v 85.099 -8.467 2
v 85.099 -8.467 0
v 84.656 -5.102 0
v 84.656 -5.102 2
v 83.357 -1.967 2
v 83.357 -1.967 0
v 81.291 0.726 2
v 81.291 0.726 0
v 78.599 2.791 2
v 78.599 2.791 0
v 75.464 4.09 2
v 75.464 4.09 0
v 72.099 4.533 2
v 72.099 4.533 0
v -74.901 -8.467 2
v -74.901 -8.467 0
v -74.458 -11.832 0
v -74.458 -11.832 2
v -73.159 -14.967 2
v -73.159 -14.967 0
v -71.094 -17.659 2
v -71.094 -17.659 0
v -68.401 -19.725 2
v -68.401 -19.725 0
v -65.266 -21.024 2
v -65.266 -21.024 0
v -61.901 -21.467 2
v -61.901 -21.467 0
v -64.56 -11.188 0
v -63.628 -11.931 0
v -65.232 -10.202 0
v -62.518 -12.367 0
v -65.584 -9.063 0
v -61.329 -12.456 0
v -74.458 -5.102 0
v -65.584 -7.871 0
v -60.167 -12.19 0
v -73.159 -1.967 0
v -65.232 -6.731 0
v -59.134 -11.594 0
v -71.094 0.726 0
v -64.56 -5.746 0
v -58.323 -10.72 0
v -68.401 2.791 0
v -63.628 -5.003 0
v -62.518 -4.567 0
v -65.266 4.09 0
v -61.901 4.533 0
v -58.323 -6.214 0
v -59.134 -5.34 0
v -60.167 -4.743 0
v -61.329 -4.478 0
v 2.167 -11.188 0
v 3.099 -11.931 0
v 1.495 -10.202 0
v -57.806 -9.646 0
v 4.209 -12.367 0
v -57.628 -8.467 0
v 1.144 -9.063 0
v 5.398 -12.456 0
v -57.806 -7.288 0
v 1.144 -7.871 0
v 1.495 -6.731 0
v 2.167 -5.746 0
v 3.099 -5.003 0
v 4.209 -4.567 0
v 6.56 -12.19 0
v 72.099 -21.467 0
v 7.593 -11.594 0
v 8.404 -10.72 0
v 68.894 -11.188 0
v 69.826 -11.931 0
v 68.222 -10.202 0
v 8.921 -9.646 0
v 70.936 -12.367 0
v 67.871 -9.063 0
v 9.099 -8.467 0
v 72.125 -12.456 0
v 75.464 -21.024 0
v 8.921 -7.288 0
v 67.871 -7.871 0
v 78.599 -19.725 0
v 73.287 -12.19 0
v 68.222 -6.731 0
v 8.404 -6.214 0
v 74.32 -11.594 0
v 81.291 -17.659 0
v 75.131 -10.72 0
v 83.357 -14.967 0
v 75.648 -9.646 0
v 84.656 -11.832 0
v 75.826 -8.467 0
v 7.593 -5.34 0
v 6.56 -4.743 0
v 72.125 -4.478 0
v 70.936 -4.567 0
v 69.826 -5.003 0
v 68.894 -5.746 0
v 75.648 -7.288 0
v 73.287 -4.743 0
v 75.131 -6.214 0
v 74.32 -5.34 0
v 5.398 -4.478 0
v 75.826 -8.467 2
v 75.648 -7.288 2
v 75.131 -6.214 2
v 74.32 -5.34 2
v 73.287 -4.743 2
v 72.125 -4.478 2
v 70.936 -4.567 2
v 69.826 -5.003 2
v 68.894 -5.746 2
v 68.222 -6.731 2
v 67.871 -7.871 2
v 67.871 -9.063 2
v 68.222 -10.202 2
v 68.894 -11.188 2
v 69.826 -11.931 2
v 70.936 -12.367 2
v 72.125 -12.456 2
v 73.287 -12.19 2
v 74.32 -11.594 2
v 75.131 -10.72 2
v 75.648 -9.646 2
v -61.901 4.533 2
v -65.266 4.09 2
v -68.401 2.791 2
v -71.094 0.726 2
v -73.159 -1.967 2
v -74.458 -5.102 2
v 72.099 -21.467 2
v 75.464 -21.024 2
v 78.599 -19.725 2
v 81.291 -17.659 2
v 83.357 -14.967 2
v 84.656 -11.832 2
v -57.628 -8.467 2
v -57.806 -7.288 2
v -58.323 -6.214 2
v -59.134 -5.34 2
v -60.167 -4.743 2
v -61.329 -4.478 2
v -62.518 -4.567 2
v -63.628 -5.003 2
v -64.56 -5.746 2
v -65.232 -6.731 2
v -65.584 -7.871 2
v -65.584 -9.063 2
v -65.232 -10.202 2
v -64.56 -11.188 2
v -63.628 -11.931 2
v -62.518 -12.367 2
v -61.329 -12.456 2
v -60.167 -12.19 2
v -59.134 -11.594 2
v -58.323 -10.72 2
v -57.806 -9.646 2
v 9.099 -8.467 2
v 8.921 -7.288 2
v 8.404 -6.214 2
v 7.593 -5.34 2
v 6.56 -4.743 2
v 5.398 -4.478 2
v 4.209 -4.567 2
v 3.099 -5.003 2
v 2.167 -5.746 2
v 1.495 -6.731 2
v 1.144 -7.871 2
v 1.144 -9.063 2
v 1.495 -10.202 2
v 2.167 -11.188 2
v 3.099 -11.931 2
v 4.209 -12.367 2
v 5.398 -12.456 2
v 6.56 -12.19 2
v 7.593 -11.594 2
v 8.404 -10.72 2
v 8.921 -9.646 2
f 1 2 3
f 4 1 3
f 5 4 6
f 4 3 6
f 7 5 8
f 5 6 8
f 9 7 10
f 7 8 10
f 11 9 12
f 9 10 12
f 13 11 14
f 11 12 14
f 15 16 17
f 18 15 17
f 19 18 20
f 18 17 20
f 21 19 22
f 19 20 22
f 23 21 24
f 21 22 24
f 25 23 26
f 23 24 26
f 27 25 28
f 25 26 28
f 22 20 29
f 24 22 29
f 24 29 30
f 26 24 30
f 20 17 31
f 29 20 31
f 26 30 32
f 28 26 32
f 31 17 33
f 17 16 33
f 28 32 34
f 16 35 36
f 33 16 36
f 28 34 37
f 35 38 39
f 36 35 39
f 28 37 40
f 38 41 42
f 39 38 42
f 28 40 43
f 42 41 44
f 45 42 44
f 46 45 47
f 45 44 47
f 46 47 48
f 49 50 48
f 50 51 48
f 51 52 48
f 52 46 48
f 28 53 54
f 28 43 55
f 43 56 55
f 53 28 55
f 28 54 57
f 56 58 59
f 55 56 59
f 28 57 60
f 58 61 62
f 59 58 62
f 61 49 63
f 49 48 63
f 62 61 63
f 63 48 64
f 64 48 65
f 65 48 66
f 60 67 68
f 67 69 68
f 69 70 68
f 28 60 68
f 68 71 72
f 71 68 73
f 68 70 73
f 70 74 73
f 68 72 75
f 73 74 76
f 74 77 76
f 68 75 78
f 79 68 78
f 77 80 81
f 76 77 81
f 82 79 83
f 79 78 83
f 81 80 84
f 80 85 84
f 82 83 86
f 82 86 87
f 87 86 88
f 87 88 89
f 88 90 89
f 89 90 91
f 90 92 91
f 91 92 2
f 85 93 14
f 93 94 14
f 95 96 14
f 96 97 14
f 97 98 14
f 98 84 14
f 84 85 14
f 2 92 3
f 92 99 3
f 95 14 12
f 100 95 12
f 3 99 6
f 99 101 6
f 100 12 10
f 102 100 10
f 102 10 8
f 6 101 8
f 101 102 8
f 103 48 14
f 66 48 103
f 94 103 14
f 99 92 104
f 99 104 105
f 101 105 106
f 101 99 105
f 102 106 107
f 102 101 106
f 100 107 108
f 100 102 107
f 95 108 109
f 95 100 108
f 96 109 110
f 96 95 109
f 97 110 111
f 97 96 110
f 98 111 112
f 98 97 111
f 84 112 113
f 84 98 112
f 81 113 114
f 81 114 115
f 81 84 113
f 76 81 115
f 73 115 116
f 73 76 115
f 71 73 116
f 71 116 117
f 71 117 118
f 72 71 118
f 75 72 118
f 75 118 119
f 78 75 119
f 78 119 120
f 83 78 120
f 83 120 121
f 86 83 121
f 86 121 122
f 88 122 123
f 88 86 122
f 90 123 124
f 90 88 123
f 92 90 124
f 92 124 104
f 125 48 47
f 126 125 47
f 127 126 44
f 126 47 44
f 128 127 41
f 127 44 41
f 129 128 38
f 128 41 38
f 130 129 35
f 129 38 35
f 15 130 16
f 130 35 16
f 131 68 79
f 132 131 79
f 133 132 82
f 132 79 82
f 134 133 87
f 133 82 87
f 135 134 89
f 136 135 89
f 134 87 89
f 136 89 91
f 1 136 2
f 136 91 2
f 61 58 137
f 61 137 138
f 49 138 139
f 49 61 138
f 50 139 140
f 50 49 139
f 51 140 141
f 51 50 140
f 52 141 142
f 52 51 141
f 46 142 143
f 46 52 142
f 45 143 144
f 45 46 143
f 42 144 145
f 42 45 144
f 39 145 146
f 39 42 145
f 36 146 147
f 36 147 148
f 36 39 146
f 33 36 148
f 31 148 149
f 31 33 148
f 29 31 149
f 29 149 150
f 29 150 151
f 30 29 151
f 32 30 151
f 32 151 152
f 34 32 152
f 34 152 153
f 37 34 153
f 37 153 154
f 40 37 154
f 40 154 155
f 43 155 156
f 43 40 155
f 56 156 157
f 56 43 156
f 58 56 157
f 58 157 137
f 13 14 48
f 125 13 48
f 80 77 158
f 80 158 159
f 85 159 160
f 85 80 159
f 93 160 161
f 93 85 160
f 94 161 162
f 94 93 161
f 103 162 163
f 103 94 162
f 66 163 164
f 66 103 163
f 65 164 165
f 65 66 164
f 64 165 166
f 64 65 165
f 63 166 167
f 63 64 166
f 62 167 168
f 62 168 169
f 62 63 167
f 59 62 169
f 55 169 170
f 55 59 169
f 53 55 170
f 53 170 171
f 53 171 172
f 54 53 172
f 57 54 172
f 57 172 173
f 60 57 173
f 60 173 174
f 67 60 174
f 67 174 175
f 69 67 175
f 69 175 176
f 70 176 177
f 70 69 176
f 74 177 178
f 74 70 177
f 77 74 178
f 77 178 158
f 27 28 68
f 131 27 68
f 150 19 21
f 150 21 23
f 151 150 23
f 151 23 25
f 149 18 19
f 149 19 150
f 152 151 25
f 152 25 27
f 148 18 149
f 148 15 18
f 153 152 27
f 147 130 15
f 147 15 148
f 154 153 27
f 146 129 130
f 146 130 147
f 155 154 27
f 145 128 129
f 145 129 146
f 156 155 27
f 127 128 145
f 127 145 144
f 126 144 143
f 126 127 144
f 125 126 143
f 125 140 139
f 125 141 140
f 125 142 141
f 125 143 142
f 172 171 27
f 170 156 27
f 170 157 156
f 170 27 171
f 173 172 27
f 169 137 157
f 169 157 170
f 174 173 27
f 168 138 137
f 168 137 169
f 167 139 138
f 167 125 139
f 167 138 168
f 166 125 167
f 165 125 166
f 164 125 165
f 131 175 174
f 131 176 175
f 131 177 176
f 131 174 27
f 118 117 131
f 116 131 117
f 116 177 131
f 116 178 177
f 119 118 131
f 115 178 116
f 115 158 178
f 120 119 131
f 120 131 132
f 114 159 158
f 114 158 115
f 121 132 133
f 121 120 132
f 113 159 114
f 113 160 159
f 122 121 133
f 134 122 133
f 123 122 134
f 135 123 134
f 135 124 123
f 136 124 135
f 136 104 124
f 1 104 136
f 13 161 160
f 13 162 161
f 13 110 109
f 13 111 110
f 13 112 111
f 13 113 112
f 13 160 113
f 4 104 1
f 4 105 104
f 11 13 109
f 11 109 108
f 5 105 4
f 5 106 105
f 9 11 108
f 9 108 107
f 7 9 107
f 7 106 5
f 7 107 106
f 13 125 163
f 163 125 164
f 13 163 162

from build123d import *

# Parameters (mm, degrees)
F0_R     = 4
F1_DEPTH = 2


with BuildPart() as f1:
    # F0 (on Top) → F1 (new body)
    with BuildSketch(Plane.XY):
        with BuildLine():
            Line((72.098875, 4.53313), (-61.901125, 4.53313))
            ThreePointArc((-61.901125, 4.53313), (-71.093513, 0.725518), (-74.901125, -8.46687))
            ThreePointArc((-74.901125, -8.46687), (-71.093513, -17.659259), (-61.901125, -21.46687))
            Line((-61.901125, -21.46687), (72.098875, -21.46687))
            ThreePointArc((72.098875, -21.46687), (81.291263, -17.659259), (85.098875, -8.46687))
            ThreePointArc((85.098875, -8.46687), (81.291263, 0.725518), (72.098875, 4.53313))
        make_face()
        with Locations((-61.628222, -8.46687)):
            Circle(F0_R, mode=Mode.SUBTRACT)
        with Locations((5.098875, -8.46687)):
            Circle(F0_R, mode=Mode.SUBTRACT)
        with Locations((71.825972, -8.46687)):
            Circle(F0_R, mode=Mode.SUBTRACT)
    extrude(amount=F1_DEPTH)


solid = f1.part
